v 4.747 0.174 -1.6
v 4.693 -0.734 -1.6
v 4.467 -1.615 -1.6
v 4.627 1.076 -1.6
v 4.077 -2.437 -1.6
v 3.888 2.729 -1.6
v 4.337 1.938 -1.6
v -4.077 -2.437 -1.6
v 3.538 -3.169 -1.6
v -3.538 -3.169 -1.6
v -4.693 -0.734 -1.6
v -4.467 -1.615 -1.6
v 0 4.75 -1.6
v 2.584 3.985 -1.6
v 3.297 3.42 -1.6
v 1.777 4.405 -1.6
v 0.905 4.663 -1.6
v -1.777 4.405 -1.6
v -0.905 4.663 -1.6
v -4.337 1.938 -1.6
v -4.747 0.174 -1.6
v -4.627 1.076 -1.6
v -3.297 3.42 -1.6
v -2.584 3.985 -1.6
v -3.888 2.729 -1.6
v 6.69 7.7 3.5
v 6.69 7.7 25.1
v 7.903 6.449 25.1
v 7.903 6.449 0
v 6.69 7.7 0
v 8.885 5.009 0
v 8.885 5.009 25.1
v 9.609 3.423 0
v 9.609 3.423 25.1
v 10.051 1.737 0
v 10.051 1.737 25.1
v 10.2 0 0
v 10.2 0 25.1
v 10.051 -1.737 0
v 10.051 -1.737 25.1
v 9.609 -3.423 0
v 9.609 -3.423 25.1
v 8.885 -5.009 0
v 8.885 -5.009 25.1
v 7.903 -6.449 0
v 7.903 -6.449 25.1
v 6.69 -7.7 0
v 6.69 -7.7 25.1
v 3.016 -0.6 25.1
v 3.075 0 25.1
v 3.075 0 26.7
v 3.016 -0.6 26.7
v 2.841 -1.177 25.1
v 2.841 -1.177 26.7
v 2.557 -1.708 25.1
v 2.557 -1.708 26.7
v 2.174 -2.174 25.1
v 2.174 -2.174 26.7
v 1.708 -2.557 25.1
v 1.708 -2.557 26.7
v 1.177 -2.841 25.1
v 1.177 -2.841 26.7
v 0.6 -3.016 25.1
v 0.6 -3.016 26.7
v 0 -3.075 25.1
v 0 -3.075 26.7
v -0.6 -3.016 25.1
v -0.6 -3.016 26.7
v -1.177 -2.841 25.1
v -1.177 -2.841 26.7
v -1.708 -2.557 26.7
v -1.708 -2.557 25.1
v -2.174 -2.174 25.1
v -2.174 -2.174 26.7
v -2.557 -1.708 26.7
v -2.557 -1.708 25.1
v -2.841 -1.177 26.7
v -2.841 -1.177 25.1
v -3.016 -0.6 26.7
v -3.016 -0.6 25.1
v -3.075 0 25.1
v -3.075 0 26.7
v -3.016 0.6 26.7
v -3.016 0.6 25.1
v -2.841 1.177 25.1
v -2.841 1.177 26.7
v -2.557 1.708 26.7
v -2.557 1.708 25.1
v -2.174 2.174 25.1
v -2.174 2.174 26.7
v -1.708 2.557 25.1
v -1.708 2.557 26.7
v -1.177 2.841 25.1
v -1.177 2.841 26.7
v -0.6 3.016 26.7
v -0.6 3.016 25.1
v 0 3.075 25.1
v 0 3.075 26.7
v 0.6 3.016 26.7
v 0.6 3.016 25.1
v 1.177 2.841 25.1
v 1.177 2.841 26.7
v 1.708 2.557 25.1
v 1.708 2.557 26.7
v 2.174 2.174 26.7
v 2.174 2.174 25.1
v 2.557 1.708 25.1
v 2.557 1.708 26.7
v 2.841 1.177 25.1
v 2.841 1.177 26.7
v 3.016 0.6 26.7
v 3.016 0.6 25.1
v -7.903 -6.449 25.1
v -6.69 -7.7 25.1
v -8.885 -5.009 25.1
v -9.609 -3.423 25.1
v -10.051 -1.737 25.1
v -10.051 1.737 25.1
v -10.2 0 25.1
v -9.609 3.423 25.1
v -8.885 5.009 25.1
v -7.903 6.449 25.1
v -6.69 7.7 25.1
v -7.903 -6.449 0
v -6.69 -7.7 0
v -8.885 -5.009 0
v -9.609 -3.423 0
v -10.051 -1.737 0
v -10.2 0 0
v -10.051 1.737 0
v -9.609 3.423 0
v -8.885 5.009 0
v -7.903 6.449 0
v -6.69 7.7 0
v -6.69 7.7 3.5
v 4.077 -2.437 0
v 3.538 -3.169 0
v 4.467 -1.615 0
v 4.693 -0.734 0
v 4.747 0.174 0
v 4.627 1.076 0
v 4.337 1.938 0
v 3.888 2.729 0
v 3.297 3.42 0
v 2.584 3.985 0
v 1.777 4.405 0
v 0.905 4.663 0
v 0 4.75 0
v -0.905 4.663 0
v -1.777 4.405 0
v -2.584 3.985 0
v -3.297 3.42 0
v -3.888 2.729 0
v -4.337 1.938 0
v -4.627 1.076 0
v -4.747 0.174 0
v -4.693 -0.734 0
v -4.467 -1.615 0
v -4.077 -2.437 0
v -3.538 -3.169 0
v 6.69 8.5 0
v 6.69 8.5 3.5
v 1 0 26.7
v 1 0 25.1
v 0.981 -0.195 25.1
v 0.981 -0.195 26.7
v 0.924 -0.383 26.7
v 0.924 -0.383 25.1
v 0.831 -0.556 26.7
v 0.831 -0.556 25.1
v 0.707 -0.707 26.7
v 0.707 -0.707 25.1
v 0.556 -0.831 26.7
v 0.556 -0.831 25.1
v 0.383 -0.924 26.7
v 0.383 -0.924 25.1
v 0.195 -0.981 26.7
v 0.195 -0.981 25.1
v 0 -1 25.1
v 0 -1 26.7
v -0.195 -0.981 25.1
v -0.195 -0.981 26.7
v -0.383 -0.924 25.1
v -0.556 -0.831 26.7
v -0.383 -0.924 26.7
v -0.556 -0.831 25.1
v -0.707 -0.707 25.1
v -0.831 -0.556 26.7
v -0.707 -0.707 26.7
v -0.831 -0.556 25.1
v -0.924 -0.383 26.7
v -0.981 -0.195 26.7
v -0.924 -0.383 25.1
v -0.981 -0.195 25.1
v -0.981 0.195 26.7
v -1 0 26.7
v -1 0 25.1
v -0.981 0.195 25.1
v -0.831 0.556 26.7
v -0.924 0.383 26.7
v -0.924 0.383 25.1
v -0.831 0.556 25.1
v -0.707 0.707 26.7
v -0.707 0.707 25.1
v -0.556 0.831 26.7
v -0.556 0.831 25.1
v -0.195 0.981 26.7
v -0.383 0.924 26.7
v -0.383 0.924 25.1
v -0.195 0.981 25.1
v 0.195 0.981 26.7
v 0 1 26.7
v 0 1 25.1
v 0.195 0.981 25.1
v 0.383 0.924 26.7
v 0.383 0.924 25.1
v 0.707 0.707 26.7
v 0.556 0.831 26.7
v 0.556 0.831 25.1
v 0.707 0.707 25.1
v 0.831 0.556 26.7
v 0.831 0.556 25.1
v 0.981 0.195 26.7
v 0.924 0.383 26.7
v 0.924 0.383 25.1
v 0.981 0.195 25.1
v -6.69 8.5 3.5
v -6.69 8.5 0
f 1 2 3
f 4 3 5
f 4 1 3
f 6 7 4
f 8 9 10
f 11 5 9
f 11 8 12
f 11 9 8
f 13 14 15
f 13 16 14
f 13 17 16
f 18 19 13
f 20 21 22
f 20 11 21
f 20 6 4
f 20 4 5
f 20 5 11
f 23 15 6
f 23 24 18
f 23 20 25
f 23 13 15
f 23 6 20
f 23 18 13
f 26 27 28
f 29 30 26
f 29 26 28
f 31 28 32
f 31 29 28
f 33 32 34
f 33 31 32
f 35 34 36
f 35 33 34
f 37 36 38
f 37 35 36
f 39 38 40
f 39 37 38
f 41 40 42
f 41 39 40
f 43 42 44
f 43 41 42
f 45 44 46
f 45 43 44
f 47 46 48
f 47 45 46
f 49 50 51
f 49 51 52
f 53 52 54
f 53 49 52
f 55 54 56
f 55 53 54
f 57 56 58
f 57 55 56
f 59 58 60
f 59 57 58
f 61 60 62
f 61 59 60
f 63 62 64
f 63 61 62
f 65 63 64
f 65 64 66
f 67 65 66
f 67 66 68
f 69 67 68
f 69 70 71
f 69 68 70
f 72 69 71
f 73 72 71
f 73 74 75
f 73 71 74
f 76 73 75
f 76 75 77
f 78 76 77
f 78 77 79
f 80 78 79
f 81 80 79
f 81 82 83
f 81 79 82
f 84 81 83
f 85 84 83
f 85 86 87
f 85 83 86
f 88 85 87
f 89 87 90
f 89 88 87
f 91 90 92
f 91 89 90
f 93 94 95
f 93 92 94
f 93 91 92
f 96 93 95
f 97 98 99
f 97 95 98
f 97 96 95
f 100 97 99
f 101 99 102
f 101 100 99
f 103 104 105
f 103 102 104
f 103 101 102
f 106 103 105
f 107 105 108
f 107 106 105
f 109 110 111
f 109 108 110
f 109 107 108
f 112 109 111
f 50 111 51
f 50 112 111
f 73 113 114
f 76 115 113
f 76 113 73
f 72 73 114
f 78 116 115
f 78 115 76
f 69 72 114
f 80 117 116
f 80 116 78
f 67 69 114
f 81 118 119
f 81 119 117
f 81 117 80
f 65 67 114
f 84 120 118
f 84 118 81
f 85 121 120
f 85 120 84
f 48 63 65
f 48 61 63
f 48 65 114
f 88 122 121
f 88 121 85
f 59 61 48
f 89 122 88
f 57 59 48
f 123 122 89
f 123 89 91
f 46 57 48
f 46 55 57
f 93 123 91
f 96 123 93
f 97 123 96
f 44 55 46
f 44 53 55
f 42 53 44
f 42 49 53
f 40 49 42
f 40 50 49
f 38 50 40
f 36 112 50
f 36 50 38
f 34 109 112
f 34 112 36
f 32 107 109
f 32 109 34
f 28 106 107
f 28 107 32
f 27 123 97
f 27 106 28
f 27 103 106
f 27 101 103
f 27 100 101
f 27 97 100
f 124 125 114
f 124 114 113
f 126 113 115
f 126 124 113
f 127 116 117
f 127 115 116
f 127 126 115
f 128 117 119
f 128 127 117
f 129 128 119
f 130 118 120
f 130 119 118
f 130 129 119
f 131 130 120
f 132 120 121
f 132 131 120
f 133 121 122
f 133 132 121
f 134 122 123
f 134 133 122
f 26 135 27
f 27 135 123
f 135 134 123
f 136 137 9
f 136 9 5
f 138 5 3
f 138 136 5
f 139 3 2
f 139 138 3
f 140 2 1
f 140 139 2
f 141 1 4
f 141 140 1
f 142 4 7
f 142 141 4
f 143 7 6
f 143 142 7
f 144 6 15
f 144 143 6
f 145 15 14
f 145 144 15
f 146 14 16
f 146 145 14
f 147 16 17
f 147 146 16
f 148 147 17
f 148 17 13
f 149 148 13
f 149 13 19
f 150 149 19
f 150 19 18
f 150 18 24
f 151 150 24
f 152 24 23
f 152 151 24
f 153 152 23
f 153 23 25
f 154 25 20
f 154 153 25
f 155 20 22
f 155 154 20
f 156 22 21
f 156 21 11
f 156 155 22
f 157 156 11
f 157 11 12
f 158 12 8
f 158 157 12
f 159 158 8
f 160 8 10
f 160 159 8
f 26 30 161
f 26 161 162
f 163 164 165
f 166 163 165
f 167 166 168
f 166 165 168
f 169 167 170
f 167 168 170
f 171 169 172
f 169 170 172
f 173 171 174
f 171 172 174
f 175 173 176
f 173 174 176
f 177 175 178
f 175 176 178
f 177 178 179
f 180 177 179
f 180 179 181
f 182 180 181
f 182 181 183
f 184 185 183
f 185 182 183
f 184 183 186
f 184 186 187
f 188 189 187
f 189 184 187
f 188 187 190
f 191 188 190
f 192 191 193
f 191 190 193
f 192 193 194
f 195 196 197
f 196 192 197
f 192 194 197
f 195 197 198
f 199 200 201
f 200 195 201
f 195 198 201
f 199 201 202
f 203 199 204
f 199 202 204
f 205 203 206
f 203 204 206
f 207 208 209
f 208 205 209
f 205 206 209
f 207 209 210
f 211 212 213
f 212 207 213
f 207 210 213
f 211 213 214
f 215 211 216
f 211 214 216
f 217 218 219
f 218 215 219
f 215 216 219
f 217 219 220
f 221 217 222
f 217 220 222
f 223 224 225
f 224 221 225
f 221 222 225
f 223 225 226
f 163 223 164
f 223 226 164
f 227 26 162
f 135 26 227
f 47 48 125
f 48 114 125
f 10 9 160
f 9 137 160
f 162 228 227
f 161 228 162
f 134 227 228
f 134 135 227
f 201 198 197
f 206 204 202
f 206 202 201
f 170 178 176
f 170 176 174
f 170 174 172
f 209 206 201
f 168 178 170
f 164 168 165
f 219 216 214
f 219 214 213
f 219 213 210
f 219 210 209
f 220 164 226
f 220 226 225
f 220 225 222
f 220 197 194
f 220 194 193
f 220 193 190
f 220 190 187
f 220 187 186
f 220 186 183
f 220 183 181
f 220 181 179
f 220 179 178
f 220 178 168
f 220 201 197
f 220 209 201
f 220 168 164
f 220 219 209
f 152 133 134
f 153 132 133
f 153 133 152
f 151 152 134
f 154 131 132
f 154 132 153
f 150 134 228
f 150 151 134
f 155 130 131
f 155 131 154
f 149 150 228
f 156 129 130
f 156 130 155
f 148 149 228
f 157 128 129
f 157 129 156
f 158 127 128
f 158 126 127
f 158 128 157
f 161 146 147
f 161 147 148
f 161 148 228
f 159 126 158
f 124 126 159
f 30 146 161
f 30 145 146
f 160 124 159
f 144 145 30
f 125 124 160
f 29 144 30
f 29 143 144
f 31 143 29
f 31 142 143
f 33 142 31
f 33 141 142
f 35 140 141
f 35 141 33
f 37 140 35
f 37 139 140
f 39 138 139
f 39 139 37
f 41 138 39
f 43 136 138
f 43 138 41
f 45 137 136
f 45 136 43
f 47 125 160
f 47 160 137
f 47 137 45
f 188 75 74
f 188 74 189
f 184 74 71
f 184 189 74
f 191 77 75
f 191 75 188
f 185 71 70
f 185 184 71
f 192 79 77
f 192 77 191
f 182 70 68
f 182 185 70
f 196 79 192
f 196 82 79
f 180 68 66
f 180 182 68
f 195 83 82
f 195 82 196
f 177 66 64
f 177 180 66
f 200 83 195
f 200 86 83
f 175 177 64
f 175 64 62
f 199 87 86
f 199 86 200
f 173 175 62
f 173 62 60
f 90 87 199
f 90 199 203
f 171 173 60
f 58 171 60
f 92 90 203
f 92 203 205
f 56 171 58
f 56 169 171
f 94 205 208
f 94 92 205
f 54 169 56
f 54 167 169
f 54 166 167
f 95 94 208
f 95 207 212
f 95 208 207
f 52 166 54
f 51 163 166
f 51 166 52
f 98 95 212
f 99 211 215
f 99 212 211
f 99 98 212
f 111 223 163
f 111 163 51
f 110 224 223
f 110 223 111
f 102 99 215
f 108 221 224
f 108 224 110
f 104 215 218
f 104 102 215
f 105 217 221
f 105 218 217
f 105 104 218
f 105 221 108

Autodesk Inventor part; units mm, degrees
ref_plane "XZ Plane" through (0, 0, 0) normal (0, 1, 0) x (-1, 0, 0)
ref_plane "XY Plane" through (0, 0, 0) normal (0, 0, 1) x (1, 0, 0)
sketch "Sketch1" plane through (0, 0, 0) normal (0, 0, 1) x (1, 0, 0)
  circle A0 centre (0, 0) radius 10.2
  dimension "d0" = 20.4
extrude "Extrusion1" add sketch "Sketch1" along normal blind 25.1
ref_plane "Work Plane1" through (0, 0, 0) normal (1, 0, 0) x (0, 1, 0)
sketch "Sketch2" plane through (0, 0, 0) normal (1, 0, 0) x (0, 1, 0)
  line L0 (10.2, 25.1) -> (-10.2, 25.1) projected
  line L1 (10.2, 25.1) -> (-10.2, 25.1)
  line L2 (-10.2, 25.1) -> (-10.2, 0)
  line L3 (-10.2, 0) -> (10.2, 0)
  line L4 (10.2, 0) -> (10.2, 25.1)
  line L5 (0, 0) -> (7.7, 0)
  line L6 (7.7, 0) -> (7.7, 25.1)
  line L7 (7.7, 25.1) -> (0, 25.1)
  line L8 (0, 25.1) -> (0, 0)
  line L9 (10.2, 0) -> (-10.2, 0) projected
  line L10 (7.7, 25.1) -> (10.2, 25.1)
  line L11 (10.2, 25.1) -> (10.2, 0)
  line L12 (10.2, 0) -> (7.7, 0)
  line L13 (7.7, 0) -> (7.7, 25.1)
  line L14 (0, 25.1) -> (-7.7, 25.1)
  line L15 (-7.7, 25.1) -> (-7.7, 0)
  line L16 (-7.7, 0) -> (0, 0)
  line L17 (0, 0) -> (0, 25.1)
  line L18 (-7.7, 0) -> (-10.2, 0)
  line L19 (-10.2, 0) -> (-10.2, 25.1)
  line L20 (-10.2, 25.1) -> (-7.7, 25.1)
  line L21 (-7.7, 25.1) -> (-7.7, 0)
  dimension "d4" = 7.7
  dimension "d5" = 7.7
extrude "Extrusion2" cut sketch "Sketch2" along normal mid plane 22 contours L4 L3 L6 L0 | L15 L3 L2 L0
sketch "Sketch3" plane through (0, 0, 25.1) normal (0, 0, 1) x (1, 0, 0)
  circle A0 centre (0, 0) radius 3.075
  circle A1 centre (0, 0) radius 1
  dimension "d8" = 6.15
  dimension "d9" = 2
extrude "Extrusion3" add sketch "Sketch3" along normal blind 1.6
sketch "Sketch4" plane through (-6.6895, 7.7, 25.1) normal (0, 1, 0) x (1, 0, 0)
  line L0 (0, 0) -> (0, 25.1) projected
  line L1 (13.3791, 25.1) -> (13.3791, 0) projected
  line L2 (0, 25.1) -> (13.3791, 25.1)
  line L3 (13.3791, 25.1) -> (13.3791, 21.6)
  line L4 (13.3791, 21.6) -> (0, 21.6)
  line L5 (0, 21.6) -> (0, 25.1)
  point P0 (6.6895, 25.1)
  dimension "d12" = 3.5
extrude "Extrusion4" add sketch "Sketch4" along normal blind 0.8
sketch "Sketch5" plane through (0, 0, 0) normal (0, 0, -1) x (-1, 0, 0)
  circle A0 centre (0, 0) radius 4.75
  line L0 (-3.5382, -3.1691) -> (3.5382, -3.1691)
  dimension "d15" = 9.5
extrude "Extrusion6" add sketch "Sketch5" along normal blind 1.6 contours A0 L0 picked at (0.1876, -0.5406)
properties part number "DCMotor"
